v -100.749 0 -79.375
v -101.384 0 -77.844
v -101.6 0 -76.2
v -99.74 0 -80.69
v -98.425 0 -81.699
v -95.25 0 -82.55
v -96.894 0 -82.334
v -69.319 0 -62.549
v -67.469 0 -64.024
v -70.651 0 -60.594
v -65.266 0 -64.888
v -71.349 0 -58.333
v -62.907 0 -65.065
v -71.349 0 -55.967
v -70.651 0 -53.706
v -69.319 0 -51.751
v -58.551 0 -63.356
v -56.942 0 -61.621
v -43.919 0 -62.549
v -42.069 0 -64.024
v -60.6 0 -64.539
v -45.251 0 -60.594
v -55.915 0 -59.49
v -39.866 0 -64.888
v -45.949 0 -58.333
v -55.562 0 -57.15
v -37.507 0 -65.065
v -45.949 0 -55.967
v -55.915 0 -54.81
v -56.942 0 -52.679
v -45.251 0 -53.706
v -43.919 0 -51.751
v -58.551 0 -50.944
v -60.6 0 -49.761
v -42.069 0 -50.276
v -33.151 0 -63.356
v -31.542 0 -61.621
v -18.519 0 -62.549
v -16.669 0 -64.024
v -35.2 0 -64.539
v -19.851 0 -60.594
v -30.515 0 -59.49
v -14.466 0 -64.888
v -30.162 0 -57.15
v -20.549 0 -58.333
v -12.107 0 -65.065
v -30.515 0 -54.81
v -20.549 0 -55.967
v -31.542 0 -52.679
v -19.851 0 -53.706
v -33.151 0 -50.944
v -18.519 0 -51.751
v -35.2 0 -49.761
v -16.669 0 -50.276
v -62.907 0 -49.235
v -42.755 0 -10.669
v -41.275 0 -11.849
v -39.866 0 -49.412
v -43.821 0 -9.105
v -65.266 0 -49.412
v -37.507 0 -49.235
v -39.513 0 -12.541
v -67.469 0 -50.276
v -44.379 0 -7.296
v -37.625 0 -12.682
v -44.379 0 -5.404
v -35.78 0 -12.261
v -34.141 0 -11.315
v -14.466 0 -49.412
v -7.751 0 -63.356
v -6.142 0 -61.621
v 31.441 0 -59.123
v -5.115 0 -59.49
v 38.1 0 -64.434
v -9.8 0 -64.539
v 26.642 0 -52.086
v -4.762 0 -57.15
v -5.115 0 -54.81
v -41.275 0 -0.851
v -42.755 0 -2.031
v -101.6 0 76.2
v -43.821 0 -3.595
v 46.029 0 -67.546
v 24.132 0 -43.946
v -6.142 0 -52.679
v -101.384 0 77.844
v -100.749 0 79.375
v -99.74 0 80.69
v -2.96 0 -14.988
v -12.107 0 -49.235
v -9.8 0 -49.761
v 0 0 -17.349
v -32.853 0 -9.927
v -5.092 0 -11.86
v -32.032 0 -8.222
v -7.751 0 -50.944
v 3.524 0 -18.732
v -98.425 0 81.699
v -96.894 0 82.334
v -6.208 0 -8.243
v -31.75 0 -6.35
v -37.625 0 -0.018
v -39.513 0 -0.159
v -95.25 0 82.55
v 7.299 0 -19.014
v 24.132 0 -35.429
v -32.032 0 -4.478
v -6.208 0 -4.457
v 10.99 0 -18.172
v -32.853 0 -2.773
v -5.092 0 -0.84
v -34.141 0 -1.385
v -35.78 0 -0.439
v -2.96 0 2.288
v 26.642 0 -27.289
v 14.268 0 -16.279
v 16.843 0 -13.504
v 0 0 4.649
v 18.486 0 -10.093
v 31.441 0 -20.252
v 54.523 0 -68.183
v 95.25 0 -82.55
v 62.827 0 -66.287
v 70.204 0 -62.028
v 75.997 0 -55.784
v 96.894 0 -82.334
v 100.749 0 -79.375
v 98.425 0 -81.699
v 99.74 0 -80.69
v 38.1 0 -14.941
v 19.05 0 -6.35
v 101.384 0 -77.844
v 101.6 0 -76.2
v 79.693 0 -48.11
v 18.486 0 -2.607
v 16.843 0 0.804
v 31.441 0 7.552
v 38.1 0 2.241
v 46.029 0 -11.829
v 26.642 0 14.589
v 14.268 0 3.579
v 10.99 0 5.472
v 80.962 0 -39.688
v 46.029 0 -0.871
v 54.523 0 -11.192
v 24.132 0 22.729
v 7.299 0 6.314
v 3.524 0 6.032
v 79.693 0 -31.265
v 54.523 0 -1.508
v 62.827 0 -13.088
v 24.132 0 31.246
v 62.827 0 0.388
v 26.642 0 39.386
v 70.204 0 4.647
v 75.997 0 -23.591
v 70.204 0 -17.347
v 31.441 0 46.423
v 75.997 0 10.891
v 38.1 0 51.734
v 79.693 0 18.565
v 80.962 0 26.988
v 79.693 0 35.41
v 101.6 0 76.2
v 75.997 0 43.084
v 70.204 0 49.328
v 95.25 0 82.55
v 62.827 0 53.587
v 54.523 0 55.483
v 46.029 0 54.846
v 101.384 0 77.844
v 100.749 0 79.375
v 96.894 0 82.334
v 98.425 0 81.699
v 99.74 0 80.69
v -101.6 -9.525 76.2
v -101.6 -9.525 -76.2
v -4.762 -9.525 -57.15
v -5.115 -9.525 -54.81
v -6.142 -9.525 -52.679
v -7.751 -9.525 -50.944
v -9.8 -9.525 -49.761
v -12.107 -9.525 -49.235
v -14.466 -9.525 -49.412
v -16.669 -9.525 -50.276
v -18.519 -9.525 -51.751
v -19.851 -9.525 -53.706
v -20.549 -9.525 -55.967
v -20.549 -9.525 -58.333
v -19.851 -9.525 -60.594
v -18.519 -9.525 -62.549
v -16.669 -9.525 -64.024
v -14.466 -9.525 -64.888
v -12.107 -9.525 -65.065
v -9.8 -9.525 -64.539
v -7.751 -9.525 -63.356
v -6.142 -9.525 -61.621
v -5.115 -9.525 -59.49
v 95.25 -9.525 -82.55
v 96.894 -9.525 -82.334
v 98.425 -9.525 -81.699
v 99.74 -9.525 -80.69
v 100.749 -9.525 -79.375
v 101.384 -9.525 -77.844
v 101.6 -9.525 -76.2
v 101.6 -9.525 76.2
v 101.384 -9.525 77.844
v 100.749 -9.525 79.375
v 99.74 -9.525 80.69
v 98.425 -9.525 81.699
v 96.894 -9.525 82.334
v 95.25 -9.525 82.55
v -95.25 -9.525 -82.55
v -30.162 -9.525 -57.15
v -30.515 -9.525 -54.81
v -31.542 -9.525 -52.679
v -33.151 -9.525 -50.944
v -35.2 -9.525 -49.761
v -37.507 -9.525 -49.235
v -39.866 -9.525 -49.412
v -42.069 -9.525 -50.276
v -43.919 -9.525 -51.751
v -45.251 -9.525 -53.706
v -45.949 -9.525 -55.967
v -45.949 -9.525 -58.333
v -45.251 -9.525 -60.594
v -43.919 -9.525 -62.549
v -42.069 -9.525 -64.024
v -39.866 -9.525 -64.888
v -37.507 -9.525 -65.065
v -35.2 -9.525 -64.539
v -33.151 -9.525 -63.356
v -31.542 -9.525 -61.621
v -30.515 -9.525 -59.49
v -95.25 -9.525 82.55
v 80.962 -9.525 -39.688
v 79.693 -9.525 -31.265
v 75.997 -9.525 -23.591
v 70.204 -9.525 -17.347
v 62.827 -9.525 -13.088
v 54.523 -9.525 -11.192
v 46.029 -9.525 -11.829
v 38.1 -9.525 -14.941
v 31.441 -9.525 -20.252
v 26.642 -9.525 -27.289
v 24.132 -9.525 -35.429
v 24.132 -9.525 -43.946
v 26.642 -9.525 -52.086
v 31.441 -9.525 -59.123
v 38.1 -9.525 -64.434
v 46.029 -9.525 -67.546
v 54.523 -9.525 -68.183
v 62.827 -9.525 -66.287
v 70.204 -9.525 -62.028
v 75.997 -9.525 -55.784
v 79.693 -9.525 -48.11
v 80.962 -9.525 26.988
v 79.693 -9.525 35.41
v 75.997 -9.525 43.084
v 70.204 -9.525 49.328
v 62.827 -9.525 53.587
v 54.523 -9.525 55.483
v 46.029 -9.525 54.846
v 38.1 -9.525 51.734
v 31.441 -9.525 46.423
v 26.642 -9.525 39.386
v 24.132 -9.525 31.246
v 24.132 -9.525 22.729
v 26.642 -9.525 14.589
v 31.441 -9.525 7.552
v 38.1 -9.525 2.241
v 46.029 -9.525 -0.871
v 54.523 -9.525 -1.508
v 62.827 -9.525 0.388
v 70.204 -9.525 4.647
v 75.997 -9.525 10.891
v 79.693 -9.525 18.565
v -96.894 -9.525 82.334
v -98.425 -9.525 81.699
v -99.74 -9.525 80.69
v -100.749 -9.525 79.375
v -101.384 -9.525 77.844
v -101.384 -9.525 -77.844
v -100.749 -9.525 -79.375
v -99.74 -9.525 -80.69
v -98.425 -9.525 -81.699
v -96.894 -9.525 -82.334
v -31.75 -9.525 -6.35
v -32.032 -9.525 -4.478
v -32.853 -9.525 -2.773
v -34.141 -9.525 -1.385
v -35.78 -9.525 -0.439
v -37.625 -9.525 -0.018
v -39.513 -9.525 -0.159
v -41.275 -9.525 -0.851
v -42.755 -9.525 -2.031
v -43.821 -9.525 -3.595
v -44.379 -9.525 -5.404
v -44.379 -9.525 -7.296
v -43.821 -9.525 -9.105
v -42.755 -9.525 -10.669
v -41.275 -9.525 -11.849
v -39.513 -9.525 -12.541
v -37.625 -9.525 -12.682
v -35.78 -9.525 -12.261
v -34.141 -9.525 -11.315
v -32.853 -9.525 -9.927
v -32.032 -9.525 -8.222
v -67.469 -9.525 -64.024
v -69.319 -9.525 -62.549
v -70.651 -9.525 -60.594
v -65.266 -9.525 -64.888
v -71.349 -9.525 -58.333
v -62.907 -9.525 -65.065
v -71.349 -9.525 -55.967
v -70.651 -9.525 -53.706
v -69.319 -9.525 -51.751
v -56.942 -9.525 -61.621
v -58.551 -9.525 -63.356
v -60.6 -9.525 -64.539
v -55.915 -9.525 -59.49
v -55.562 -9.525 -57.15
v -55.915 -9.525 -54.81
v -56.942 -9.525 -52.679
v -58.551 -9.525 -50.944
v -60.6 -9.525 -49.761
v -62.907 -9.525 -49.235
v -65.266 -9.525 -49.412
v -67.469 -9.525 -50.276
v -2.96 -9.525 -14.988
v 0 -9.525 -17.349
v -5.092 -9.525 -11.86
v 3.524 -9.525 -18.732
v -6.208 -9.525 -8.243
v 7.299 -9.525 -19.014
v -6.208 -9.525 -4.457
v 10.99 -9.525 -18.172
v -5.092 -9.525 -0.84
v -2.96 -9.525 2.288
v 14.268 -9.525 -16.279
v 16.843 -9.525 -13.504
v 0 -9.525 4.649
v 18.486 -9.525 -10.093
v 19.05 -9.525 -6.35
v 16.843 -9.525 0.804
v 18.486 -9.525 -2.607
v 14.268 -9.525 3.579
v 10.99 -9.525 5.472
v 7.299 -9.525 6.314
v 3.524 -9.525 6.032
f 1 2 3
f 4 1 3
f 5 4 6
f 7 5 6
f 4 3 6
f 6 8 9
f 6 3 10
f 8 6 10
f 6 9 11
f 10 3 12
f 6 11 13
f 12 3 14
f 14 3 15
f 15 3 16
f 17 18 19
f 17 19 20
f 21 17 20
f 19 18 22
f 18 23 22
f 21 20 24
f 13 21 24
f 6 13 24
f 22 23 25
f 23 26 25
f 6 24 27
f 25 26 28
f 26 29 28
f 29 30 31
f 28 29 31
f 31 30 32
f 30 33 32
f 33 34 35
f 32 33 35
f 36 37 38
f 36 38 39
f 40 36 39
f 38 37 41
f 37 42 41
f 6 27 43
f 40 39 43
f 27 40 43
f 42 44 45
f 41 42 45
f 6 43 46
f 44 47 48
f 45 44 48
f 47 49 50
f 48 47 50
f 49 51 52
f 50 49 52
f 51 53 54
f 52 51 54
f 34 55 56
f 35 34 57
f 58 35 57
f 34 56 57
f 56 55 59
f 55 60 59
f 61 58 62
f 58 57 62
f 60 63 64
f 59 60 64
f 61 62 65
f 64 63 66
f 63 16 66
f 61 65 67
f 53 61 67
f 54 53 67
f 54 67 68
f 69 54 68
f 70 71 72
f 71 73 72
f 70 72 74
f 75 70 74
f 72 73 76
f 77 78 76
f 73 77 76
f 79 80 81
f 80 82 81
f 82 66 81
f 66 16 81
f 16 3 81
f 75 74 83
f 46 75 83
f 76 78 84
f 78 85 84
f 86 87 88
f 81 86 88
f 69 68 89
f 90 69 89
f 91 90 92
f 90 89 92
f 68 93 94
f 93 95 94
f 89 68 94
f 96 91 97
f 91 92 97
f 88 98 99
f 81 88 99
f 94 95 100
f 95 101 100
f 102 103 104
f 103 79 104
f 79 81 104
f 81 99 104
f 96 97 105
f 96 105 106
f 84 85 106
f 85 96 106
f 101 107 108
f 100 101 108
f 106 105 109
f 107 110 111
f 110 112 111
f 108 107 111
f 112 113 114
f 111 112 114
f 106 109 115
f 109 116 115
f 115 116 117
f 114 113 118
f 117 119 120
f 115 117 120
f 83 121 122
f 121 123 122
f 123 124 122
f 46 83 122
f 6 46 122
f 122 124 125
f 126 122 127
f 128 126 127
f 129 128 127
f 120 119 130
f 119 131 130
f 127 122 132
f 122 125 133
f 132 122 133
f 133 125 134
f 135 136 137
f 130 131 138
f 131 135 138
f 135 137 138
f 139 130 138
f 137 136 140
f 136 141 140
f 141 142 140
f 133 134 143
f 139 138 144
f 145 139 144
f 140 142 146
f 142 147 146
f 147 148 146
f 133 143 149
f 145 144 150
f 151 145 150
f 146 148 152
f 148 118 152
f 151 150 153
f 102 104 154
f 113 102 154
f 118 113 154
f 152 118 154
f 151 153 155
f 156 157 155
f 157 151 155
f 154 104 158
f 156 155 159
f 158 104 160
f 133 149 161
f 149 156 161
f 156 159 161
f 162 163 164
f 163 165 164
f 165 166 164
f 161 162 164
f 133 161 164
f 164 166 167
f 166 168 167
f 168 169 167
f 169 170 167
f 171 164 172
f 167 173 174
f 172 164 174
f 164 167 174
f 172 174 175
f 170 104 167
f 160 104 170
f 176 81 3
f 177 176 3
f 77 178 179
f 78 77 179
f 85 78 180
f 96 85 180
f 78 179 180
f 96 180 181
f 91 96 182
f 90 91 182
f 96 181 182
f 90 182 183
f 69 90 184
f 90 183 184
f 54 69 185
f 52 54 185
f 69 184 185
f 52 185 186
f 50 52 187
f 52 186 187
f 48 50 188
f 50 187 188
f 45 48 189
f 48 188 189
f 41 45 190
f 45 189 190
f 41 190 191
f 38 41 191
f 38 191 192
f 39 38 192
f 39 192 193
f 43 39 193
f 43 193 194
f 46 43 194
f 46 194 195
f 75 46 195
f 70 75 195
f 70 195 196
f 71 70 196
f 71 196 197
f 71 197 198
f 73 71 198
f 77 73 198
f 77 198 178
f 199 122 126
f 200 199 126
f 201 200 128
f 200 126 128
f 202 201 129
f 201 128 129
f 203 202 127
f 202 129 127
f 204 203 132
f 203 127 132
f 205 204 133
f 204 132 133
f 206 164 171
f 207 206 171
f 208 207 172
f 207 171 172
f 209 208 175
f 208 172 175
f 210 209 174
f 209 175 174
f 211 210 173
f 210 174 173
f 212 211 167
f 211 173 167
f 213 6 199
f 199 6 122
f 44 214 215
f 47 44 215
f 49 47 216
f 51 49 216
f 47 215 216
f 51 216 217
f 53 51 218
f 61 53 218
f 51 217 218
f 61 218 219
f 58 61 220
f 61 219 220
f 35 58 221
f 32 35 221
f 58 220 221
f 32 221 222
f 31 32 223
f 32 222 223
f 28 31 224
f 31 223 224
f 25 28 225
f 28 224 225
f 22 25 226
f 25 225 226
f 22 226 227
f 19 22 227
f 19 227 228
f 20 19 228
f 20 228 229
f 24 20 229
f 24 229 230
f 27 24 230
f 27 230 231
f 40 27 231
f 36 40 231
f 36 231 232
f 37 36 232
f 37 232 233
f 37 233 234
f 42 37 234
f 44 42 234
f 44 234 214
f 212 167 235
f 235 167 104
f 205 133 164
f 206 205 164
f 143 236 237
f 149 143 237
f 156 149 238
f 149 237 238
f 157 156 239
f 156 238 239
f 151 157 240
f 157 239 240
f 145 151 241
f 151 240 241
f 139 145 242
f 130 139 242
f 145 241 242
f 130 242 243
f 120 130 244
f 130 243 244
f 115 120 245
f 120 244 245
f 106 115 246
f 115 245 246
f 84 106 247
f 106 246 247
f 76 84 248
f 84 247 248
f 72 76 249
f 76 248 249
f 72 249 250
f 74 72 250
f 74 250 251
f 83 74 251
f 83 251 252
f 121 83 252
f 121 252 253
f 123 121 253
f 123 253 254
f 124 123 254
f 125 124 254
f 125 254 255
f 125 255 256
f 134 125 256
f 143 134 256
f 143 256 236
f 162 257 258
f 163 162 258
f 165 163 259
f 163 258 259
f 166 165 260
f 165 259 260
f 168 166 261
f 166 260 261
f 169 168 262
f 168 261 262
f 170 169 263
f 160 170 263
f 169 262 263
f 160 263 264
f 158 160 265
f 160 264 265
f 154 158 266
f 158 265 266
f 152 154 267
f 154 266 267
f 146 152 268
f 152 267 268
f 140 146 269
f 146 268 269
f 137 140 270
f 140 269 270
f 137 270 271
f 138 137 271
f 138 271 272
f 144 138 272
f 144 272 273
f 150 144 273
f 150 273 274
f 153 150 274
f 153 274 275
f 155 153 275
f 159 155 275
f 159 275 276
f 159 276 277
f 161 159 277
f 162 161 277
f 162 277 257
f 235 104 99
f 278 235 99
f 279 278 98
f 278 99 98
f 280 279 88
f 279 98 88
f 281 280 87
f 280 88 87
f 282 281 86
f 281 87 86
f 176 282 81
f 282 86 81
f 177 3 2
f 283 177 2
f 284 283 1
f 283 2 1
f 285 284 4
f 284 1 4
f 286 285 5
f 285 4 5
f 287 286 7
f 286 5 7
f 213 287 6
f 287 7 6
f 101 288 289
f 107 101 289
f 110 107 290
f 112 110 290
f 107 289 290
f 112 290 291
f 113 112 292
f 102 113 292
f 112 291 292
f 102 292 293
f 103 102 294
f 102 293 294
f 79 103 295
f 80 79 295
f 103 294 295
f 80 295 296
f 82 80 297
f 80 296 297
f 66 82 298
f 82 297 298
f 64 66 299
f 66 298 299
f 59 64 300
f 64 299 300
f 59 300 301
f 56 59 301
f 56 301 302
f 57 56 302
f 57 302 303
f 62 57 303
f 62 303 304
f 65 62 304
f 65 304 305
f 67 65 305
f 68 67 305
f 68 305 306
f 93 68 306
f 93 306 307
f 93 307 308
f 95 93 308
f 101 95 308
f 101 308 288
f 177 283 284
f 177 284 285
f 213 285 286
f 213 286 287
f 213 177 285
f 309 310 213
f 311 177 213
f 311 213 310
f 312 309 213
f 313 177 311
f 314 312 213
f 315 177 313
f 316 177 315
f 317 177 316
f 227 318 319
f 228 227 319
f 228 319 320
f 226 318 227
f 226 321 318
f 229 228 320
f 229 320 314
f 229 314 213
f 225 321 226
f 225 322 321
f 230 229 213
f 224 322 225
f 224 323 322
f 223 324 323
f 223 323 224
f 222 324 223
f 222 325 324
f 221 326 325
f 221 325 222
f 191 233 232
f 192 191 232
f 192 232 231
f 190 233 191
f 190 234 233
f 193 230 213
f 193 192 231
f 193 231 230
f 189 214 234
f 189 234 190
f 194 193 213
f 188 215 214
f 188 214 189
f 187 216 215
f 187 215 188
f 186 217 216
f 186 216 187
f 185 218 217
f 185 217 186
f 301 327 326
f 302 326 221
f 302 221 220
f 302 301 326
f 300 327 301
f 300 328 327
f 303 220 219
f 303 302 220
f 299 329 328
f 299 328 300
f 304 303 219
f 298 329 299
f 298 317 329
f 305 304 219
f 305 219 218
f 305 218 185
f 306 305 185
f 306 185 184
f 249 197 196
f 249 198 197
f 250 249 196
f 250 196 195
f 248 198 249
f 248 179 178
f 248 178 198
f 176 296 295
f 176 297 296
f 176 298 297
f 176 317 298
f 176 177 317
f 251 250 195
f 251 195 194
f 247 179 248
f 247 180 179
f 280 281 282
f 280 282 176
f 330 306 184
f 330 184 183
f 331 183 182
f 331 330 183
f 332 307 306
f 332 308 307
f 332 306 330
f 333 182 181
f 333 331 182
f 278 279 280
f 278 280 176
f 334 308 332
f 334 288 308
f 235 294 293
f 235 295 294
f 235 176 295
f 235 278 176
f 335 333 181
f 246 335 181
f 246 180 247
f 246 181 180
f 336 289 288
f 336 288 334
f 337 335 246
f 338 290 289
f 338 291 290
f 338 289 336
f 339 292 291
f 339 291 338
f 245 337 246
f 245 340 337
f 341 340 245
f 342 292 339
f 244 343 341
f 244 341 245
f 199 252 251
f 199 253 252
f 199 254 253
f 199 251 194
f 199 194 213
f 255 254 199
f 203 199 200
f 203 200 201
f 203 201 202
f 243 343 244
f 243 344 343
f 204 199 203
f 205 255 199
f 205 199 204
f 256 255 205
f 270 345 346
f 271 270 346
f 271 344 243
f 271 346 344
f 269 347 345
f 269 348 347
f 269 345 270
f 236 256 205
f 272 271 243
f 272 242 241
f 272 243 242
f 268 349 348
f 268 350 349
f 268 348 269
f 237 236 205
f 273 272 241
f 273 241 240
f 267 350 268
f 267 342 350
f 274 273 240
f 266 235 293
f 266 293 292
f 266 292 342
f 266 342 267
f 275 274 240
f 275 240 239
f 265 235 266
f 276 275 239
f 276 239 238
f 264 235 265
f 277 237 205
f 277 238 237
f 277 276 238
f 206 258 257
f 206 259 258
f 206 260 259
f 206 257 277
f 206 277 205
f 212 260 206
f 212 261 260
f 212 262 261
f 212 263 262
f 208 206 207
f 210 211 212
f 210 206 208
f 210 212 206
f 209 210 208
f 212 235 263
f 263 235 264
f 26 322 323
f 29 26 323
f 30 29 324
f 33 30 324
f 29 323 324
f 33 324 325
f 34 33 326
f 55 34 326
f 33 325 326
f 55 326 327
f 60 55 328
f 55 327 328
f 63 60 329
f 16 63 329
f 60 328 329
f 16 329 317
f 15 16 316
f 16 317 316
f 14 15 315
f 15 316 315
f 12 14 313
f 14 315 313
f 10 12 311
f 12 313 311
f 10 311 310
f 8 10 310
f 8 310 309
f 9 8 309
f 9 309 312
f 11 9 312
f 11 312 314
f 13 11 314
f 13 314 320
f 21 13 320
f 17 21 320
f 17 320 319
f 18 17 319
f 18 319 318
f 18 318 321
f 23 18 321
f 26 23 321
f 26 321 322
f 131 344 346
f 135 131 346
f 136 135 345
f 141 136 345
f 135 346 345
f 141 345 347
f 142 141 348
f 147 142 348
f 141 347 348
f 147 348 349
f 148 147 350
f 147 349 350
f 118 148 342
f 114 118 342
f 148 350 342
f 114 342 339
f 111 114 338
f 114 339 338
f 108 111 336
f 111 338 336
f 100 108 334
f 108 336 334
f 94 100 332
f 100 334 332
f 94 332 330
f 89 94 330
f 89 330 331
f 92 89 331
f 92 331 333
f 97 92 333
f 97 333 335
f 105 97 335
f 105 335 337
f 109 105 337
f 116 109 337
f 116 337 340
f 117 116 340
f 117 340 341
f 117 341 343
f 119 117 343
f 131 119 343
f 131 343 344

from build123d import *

# Parameters (mm, degrees)
F1_DEPTH = 9.525
F2_R     = 28.575
F3_R     = 7.9375
F5_R     = 6.35
F4_R     = 12.7
F6_DEPTH = 9.526


with BuildPart() as f1:
    # F0 (on Front) → F1 (new body)
    with BuildSketch(Plane.XZ):
        with BuildLine():
            Line((-95.25, -82.55), (95.25, -82.55))
            ThreePointArc((95.25, -82.55), (99.740128, -80.690128), (101.6, -76.2))
            Line((101.6, -76.2), (101.6, 76.2))
            ThreePointArc((101.6, 76.2), (99.740128, 80.690128), (95.25, 82.55))
            Line((95.25, 82.55), (-95.25, 82.55))
            ThreePointArc((-95.25, 82.55), (-99.740128, 80.690128), (-101.6, 76.2))
            Line((-101.6, 76.2), (-101.6, -76.2))
            ThreePointArc((-101.6, -76.2), (-99.740128, -80.690128), (-95.25, -82.55))
        make_face()
    extrude(amount=F1_DEPTH)

    # F2 (on face) + F3 (on face) + F5 (on face) + F4 (on face) → F6 (cut, through all)
    with BuildSketch(Plane.XZ.offset(9.525)):
        with Locations((52.3875, 26.9875)):
            Circle(F2_R)
        with Locations((52.3875, -39.6875)):
            Circle(F2_R)
    with BuildSketch(Plane.XZ.offset(9.525)):
        with Locations((-63.5, -57.15)):
            Circle(F3_R)
        with Locations((-38.1, -57.15)):
            Circle(F3_R)
        with Locations((-12.7, -57.15)):
            Circle(F3_R)
    with BuildSketch(Plane.XZ.offset(9.525)):
        with Locations((-38.1, -6.35)):
            Circle(F5_R)
    with BuildSketch(Plane.XZ.offset(9.525)):
        with Locations((6.35, -6.35)):
            Circle(F4_R)
    extrude(amount=-F6_DEPTH, mode=Mode.SUBTRACT)


solid = f1.part
